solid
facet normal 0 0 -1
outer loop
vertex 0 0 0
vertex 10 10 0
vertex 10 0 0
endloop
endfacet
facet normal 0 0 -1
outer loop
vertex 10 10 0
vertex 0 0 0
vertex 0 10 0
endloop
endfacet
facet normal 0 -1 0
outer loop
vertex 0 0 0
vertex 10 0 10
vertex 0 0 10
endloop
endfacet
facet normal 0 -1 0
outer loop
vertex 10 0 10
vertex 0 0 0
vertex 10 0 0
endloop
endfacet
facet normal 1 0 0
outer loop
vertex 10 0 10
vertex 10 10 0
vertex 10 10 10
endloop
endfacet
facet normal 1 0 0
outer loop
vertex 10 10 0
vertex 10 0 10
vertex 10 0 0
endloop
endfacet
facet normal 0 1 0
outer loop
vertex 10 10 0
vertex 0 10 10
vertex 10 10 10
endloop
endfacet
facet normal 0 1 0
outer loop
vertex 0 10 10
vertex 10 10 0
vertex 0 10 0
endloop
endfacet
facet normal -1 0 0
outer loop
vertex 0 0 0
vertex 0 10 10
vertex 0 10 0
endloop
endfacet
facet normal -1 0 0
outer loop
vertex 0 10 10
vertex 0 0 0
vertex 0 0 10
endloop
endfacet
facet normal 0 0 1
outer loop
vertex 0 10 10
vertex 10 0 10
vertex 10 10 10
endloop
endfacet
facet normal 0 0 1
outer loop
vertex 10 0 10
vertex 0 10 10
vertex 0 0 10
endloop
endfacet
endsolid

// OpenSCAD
v = [[0, 0, 0], [10, 0, 0], [10, 10, 0], [0, 10, 0], [0, 0, 10], [10, 0, 10], [10, 10, 10], [0, 10, 10], [0,0,1e-14]];
f = [[0, 1, 2, 3], [8, 4, 5, 1], [1, 5, 6, 2], [2, 6, 7, 3], [3, 7, 4, 0], [6, 5, 4, 7]];
polyhedron(v, faces=f);
